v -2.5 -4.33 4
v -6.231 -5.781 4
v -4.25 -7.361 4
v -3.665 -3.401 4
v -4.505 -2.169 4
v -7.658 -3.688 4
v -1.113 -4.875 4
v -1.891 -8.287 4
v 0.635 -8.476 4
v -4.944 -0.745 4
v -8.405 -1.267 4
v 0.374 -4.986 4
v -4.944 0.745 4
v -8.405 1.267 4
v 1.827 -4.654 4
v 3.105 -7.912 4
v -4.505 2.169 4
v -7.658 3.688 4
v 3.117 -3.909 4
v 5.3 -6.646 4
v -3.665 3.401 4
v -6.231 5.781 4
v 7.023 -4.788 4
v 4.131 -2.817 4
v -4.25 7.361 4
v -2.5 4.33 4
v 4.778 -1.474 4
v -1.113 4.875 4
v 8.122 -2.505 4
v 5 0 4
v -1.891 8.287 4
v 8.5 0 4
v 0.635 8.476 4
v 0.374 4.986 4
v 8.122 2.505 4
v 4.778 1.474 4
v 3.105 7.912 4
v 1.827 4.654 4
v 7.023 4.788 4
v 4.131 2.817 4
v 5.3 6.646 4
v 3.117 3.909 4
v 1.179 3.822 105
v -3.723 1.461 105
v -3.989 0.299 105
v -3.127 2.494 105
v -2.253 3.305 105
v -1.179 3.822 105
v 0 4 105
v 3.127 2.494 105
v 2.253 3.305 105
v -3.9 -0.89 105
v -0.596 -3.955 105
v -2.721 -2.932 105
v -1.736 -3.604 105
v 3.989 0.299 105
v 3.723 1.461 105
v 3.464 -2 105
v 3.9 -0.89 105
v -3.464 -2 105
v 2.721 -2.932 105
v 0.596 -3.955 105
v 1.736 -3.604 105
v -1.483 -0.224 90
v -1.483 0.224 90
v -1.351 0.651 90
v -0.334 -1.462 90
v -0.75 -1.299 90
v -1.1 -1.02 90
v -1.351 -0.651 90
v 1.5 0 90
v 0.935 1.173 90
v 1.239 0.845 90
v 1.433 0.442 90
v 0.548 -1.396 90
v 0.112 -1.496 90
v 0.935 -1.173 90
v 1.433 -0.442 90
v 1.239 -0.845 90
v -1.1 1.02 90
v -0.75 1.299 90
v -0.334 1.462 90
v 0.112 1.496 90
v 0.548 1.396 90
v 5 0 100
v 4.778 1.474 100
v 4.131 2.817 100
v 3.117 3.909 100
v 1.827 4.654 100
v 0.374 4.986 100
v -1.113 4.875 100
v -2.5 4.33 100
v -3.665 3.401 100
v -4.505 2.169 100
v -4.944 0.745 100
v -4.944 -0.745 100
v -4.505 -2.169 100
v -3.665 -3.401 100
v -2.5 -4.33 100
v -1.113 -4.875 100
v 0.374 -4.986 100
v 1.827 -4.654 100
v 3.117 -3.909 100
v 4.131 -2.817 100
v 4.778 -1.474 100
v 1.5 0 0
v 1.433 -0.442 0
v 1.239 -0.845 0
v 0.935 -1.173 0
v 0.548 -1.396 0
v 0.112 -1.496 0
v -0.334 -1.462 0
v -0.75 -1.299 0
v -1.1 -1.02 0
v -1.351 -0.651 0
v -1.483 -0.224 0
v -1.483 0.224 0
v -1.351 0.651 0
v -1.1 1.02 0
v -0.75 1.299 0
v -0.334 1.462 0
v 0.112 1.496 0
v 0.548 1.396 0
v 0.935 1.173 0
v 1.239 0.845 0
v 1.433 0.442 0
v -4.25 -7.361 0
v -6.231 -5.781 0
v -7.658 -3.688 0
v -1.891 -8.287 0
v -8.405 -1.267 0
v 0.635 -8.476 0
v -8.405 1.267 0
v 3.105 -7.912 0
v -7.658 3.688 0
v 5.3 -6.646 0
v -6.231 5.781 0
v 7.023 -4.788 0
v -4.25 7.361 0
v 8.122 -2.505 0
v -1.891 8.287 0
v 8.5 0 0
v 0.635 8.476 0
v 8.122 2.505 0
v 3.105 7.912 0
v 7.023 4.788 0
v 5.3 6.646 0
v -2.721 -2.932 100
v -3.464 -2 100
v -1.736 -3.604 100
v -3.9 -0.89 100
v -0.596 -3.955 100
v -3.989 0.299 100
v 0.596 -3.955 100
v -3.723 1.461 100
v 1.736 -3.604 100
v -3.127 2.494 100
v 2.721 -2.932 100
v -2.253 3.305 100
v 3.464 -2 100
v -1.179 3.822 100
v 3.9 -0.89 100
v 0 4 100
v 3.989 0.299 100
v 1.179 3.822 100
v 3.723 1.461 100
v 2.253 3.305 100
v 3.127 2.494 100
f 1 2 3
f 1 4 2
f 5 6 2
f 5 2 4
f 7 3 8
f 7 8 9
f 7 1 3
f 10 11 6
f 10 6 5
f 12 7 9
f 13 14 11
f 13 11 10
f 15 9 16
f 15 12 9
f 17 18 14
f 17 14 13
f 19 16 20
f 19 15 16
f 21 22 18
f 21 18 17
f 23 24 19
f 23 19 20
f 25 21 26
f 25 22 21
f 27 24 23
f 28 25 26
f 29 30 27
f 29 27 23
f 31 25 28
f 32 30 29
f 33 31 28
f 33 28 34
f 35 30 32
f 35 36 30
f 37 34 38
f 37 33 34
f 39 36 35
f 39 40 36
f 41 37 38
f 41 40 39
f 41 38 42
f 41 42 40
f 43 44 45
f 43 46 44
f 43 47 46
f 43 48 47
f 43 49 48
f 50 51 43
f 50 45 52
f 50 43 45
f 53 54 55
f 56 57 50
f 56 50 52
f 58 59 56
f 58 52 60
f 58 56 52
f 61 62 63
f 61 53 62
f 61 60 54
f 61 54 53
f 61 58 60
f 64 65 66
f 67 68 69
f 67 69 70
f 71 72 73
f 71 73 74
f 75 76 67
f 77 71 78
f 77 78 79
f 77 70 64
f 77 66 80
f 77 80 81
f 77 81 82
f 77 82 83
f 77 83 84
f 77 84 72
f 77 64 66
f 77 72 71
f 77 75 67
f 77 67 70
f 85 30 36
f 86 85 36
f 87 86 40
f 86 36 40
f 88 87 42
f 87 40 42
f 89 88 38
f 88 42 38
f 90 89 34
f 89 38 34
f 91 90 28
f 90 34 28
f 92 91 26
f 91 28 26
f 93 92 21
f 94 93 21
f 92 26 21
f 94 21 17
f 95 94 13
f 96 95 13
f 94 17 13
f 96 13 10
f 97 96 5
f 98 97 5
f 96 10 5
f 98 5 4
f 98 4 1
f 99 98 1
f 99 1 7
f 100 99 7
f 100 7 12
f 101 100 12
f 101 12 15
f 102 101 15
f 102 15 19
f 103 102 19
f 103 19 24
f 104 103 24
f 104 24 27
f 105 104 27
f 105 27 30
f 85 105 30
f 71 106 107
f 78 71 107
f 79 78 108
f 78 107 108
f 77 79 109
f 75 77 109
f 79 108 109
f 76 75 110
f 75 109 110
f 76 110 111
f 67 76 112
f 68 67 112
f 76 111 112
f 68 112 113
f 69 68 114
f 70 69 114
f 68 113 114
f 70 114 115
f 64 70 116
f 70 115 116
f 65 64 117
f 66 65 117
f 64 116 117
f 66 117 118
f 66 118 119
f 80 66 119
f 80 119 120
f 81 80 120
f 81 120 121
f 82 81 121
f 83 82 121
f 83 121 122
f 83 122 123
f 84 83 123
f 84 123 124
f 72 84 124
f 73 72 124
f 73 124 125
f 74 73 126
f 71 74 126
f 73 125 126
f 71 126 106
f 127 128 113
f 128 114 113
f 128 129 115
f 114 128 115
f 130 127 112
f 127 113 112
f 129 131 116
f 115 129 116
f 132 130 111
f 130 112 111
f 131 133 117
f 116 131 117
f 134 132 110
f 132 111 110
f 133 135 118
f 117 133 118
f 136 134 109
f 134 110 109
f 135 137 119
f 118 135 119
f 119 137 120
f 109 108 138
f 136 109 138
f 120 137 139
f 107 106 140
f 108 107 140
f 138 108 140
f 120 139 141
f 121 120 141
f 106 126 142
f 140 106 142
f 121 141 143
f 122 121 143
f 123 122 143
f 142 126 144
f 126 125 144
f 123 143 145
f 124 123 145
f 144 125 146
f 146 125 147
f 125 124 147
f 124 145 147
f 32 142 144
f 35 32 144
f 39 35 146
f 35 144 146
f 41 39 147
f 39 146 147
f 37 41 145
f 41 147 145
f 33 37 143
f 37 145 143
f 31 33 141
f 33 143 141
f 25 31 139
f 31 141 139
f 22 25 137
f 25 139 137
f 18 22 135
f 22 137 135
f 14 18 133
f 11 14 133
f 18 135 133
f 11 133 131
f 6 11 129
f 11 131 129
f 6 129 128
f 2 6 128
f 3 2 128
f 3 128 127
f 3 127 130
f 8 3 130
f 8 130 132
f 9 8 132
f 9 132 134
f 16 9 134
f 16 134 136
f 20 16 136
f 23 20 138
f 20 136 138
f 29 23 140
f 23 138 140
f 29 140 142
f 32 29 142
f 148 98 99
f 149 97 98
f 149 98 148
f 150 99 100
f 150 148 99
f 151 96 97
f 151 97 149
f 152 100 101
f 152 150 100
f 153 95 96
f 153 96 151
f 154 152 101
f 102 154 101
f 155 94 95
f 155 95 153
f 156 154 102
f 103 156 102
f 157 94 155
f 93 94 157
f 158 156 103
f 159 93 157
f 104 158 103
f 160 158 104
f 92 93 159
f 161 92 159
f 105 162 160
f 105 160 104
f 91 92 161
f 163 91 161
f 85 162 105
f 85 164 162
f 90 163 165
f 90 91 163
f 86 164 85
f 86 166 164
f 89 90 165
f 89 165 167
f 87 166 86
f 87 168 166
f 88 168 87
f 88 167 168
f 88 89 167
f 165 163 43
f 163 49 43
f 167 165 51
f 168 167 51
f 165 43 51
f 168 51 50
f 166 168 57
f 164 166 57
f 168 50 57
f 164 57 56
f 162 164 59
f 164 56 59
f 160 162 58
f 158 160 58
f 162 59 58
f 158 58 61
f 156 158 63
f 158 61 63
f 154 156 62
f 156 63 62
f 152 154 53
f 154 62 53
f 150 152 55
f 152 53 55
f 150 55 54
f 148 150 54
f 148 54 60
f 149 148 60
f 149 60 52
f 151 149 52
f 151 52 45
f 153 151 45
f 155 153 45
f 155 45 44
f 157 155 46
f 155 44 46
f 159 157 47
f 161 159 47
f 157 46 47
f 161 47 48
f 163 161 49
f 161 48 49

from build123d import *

# Parameters (mm, degrees)
F0_R     = 8.5
F1_DEPTH = 4
F2_R     = 5
F3_DEPTH = 100
F4_W     = 4
F4_H     = 5
F6_R     = 1.5
F7_DEPTH = 90


with BuildPart() as f1:
    # F0 (on Top) → F1 (new body)
    with BuildSketch(Plane.XY):
        Circle(F0_R)
    extrude(amount=F1_DEPTH)

    # F2 (on Top) → F3 (join)
    with BuildSketch(Plane.XY):
        Circle(F2_R)
    extrude(amount=F3_DEPTH)

    # F4 (on Right) → F5 (revolve)
    with BuildSketch(Plane.YZ):
        with Locations((2, 102.5)):
            Rectangle(F4_W, F4_H)
    revolve(axis=Axis((0, 0, 102.5), (0, 0, -1)))

    # F6 (on face) → F7 (cut)
    with BuildSketch(Plane(origin=(0, 0, 0), x_dir=(1, 0, 0), z_dir=(0, 0, -1))):
        Circle(F6_R)
    extrude(amount=-F7_DEPTH, mode=Mode.SUBTRACT)


solid = f1.part
